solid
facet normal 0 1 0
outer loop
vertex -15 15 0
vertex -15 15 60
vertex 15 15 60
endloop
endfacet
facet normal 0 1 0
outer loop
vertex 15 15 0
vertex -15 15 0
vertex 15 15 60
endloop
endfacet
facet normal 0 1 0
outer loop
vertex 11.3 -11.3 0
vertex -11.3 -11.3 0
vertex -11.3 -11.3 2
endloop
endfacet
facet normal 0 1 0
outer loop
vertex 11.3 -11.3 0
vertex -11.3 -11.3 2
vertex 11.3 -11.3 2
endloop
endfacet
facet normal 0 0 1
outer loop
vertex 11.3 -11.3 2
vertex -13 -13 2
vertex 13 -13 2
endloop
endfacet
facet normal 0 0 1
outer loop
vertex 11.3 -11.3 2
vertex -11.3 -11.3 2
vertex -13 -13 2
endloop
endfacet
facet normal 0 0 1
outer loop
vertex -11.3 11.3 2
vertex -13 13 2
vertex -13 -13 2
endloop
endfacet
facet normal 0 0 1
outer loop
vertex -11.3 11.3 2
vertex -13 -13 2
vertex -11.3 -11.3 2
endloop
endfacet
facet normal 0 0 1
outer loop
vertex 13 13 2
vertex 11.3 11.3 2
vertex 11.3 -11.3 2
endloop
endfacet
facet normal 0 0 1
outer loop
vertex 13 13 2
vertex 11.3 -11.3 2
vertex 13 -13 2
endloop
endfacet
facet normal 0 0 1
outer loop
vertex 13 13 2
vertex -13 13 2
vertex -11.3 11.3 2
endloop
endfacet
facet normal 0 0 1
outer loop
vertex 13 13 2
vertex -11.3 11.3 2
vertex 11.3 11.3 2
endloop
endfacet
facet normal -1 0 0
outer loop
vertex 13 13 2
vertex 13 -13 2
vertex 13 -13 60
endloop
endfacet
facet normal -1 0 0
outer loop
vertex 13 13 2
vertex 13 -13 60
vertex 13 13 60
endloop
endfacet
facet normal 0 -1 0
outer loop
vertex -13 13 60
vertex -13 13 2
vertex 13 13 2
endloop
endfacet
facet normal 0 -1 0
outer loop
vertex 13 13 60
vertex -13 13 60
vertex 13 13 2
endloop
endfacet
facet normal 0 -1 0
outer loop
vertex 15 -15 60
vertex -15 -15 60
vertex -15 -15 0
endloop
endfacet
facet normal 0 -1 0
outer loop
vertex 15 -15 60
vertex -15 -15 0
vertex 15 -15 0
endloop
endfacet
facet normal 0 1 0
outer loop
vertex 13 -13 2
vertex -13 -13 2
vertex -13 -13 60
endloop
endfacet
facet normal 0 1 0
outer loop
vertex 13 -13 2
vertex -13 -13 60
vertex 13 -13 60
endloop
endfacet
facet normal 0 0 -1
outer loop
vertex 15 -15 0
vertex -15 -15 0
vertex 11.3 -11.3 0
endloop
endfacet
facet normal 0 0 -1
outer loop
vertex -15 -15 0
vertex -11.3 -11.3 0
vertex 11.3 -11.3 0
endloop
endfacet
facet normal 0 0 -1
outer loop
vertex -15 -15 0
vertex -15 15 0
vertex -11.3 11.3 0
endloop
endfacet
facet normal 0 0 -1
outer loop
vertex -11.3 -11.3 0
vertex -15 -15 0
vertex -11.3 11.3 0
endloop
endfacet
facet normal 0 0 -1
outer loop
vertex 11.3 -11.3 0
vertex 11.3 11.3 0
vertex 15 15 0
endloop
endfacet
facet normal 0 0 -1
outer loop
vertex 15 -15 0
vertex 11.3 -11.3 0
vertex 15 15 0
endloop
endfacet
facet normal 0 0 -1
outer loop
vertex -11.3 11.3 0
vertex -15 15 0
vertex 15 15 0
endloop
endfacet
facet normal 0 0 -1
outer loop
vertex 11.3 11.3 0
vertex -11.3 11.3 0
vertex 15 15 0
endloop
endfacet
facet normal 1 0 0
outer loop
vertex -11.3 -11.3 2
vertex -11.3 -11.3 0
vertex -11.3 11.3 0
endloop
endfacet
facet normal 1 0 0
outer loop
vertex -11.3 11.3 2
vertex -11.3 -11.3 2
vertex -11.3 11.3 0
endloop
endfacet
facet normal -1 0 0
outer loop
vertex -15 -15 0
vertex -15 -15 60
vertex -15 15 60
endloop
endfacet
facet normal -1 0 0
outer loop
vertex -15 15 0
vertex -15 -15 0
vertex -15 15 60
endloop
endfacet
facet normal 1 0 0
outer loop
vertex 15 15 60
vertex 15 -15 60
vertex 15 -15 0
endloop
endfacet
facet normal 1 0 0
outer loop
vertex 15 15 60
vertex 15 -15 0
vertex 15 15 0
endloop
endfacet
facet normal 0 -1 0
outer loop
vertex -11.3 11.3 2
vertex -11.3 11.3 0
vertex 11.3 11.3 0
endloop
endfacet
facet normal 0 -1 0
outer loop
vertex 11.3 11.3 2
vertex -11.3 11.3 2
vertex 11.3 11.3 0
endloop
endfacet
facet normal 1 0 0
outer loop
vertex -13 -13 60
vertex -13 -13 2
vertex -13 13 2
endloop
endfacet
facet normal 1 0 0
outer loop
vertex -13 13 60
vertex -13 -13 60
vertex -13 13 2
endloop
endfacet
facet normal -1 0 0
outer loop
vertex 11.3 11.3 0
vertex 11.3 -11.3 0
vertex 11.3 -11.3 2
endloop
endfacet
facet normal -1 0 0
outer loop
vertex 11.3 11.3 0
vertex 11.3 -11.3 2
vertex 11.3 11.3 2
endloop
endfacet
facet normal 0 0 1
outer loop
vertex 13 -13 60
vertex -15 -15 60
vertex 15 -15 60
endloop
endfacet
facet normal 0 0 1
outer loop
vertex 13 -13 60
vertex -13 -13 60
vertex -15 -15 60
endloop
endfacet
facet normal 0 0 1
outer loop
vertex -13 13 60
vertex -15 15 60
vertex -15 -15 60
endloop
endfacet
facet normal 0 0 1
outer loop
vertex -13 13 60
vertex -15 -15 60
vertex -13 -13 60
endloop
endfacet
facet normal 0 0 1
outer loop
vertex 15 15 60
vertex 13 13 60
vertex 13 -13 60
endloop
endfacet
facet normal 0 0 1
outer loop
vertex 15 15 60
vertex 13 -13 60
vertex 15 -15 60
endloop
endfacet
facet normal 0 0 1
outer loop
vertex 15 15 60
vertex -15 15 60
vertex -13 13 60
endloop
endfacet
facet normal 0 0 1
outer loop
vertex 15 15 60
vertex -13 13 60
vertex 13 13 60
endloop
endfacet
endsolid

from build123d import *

# Parameters (mm, degrees)
F0_W     = 30
F0_H     = 30
F0_W_2   = 26
F0_H_2   = 26
F1_DEPTH = 60
F3_DEPTH = 3
F0_W_3   = 22.6
F0_H_3   = 22.6
F4_DEPTH = 2


with BuildPart() as f1:
    # F0 (on Top) → F1 (new body)
    with BuildSketch(Plane.XY):
        Rectangle(F0_W, F0_H)
        Rectangle(F0_W_2, F0_H_2, mode=Mode.SUBTRACT)
    extrude(amount=F1_DEPTH)

    # F2 (on face) → F3 (cut)
    with BuildSketch(Plane(origin=(0, 0, 0), x_dir=(1, 0, 0), z_dir=(0, 0, -1))):
        with BuildLine():
            ThreePointArc((-2.5, 0), (0, -2.5), (2.5, 0))
            ThreePointArc((2.5, 0), (0, 2.5), (-2.5, 0))
        make_face()
    extrude(amount=-F3_DEPTH, mode=Mode.SUBTRACT)

    # F0 (on Top) → F4 (join)
    with BuildSketch(Plane.XY):
        Rectangle(F0_W_2, F0_H_2)
        Rectangle(F0_W_3, F0_H_3, mode=Mode.SUBTRACT)
    extrude(amount=F4_DEPTH)


solid = f1.part
